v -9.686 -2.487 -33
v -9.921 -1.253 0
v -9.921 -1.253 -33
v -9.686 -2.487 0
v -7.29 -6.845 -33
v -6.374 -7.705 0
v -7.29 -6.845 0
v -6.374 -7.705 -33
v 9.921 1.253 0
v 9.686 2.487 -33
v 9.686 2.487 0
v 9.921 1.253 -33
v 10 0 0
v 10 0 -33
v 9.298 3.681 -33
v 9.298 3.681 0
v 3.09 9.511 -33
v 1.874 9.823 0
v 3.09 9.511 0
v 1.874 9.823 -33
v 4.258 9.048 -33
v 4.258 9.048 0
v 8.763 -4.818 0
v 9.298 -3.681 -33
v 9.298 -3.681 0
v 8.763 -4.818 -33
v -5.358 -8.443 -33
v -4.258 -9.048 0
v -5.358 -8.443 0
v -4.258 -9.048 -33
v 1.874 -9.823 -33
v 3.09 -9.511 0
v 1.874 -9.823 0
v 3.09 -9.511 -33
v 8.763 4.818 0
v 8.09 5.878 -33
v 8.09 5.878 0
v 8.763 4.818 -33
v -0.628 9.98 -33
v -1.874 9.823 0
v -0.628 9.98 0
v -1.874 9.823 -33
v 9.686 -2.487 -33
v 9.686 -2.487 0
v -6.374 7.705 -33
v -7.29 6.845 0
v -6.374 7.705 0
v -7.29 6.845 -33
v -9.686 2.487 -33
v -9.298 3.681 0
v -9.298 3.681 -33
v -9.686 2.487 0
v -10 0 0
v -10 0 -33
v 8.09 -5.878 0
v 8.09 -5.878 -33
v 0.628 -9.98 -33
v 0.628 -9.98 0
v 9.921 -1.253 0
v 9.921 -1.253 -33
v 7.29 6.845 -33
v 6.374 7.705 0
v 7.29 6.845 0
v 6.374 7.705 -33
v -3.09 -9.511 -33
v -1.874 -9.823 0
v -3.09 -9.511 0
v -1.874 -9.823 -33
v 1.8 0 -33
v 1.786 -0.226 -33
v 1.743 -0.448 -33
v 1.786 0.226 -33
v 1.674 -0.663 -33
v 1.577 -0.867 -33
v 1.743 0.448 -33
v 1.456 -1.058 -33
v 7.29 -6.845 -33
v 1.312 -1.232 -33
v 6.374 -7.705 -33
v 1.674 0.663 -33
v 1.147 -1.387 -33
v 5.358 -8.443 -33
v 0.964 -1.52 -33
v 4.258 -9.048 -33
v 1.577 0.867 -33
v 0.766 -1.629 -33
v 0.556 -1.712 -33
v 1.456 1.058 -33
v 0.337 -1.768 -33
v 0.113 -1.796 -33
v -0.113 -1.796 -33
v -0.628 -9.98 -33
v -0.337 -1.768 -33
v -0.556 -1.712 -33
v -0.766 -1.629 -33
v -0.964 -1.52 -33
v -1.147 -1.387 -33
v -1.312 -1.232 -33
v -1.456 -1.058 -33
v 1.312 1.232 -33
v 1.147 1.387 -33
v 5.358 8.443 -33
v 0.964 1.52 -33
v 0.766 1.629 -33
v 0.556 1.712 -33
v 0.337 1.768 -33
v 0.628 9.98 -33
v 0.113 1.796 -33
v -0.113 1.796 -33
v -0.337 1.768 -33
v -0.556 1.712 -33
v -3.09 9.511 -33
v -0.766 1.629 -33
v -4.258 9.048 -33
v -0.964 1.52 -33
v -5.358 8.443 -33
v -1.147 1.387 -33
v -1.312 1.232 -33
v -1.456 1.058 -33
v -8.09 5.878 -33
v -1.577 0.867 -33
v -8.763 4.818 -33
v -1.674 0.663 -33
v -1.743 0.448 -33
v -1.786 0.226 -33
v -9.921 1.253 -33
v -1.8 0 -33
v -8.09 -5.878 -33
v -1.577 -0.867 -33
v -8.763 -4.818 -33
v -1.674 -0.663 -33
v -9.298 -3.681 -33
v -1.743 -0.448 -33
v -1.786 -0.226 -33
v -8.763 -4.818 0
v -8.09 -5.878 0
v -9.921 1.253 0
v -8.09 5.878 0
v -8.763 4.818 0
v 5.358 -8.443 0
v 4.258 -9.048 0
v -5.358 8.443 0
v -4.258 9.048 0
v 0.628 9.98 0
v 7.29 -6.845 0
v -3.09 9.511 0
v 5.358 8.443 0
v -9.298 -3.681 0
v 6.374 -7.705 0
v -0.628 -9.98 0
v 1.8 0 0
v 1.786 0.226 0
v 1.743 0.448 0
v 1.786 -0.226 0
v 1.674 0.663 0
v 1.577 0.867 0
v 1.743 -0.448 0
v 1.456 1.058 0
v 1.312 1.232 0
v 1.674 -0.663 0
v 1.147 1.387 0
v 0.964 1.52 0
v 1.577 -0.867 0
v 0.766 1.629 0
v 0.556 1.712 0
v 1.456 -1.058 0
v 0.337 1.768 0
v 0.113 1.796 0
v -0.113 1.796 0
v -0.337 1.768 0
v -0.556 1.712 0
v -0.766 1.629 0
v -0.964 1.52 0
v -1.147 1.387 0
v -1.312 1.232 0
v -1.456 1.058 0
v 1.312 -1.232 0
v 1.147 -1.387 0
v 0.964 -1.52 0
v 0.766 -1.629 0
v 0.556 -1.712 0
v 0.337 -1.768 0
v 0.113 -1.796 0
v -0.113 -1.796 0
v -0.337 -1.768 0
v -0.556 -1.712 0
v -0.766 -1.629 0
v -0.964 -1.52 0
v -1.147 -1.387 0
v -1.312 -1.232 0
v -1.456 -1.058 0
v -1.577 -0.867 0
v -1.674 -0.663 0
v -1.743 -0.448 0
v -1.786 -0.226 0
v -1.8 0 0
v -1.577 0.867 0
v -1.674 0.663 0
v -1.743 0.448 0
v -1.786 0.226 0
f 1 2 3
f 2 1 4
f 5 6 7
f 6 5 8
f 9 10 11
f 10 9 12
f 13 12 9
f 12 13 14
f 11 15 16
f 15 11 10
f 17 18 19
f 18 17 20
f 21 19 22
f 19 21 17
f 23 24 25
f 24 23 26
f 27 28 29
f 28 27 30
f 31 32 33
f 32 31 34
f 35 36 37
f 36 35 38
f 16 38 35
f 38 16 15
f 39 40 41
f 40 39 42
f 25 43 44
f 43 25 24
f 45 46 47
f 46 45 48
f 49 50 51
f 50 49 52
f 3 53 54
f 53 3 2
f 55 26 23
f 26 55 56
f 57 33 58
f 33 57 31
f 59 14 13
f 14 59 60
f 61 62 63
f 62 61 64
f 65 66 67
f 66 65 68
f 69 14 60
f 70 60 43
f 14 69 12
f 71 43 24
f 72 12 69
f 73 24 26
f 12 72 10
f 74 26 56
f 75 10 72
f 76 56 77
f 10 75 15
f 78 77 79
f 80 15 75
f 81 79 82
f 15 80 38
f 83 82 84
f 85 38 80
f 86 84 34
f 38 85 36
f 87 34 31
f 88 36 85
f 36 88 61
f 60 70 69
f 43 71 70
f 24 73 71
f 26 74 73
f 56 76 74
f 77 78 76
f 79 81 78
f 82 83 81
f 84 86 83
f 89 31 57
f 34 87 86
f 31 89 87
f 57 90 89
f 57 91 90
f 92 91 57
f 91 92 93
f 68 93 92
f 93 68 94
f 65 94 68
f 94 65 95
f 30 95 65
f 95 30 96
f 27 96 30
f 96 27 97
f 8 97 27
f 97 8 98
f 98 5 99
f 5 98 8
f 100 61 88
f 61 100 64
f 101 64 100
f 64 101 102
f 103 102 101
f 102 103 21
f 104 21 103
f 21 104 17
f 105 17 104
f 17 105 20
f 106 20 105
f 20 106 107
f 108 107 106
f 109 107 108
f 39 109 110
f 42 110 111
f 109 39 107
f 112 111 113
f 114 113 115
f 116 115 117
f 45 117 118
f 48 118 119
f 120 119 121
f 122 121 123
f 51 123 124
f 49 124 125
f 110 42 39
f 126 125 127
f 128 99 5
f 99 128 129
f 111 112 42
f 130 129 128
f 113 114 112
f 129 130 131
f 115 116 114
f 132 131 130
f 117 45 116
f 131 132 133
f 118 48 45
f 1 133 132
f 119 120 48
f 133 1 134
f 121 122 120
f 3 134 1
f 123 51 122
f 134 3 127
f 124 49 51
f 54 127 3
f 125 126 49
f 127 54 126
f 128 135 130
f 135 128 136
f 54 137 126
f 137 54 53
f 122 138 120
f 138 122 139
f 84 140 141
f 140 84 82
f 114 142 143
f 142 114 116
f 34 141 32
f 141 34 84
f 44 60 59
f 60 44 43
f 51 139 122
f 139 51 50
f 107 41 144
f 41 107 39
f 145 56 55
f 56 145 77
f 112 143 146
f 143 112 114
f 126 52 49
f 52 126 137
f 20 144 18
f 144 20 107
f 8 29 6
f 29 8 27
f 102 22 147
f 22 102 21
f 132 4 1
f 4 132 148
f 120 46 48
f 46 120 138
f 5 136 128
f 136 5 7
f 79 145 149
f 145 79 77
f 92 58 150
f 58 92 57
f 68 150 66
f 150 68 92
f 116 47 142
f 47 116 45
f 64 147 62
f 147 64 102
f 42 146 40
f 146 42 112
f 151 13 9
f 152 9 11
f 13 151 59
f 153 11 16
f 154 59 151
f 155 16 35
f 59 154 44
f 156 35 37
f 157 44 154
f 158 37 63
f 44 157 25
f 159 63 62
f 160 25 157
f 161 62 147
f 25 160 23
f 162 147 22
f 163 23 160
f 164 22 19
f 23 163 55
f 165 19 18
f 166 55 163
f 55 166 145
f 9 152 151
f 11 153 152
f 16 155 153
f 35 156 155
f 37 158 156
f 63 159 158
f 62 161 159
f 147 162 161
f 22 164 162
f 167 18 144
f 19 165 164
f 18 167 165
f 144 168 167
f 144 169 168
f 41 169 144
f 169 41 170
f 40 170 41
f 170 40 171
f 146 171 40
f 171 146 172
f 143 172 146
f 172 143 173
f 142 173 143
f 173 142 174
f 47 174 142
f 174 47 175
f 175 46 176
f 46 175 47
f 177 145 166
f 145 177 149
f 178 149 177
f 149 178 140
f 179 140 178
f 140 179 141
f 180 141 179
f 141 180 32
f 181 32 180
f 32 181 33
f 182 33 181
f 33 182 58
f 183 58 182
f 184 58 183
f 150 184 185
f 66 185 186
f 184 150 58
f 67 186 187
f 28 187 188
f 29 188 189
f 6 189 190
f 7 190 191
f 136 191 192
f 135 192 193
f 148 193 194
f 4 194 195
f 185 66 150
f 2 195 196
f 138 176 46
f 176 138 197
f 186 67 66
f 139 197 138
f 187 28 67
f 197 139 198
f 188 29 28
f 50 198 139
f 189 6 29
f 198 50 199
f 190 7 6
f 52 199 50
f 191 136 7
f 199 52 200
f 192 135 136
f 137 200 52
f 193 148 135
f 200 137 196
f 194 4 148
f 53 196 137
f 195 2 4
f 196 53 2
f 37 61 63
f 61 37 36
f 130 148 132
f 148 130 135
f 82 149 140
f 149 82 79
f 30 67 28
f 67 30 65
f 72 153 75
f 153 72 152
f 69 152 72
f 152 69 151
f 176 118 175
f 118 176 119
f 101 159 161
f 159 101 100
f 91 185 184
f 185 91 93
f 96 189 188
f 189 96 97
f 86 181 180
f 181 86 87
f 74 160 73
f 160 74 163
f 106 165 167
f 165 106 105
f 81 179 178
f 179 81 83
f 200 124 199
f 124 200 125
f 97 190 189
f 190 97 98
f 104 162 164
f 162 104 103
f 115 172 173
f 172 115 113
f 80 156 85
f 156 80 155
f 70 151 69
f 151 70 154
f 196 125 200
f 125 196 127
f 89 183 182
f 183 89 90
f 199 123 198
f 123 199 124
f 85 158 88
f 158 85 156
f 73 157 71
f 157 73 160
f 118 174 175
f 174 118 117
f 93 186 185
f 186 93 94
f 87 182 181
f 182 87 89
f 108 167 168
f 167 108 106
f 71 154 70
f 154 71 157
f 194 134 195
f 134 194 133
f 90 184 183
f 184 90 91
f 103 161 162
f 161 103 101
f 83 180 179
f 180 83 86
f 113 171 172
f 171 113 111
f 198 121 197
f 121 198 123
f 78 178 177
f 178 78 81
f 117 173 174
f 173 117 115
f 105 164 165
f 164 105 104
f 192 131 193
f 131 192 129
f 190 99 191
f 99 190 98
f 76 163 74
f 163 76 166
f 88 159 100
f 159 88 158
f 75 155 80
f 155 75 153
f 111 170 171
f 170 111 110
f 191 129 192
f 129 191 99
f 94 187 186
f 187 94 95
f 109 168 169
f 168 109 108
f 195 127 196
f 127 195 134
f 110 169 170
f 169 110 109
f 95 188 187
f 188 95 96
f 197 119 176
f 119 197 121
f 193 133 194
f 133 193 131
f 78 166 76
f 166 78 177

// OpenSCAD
$fn = 50;


difference() {
	union() {
		translate(v = [0, 0, -33.0000000000]) {
			cylinder(h = 33, r = 10.0000000000);
		}
		cylinder(h = 0, r = 19.0000000000);
	}
	union() {
		#translate(v = [0, 0, -33]) {
			cylinder(h = 33, r = 1.8000000000);
		}
	}
}
